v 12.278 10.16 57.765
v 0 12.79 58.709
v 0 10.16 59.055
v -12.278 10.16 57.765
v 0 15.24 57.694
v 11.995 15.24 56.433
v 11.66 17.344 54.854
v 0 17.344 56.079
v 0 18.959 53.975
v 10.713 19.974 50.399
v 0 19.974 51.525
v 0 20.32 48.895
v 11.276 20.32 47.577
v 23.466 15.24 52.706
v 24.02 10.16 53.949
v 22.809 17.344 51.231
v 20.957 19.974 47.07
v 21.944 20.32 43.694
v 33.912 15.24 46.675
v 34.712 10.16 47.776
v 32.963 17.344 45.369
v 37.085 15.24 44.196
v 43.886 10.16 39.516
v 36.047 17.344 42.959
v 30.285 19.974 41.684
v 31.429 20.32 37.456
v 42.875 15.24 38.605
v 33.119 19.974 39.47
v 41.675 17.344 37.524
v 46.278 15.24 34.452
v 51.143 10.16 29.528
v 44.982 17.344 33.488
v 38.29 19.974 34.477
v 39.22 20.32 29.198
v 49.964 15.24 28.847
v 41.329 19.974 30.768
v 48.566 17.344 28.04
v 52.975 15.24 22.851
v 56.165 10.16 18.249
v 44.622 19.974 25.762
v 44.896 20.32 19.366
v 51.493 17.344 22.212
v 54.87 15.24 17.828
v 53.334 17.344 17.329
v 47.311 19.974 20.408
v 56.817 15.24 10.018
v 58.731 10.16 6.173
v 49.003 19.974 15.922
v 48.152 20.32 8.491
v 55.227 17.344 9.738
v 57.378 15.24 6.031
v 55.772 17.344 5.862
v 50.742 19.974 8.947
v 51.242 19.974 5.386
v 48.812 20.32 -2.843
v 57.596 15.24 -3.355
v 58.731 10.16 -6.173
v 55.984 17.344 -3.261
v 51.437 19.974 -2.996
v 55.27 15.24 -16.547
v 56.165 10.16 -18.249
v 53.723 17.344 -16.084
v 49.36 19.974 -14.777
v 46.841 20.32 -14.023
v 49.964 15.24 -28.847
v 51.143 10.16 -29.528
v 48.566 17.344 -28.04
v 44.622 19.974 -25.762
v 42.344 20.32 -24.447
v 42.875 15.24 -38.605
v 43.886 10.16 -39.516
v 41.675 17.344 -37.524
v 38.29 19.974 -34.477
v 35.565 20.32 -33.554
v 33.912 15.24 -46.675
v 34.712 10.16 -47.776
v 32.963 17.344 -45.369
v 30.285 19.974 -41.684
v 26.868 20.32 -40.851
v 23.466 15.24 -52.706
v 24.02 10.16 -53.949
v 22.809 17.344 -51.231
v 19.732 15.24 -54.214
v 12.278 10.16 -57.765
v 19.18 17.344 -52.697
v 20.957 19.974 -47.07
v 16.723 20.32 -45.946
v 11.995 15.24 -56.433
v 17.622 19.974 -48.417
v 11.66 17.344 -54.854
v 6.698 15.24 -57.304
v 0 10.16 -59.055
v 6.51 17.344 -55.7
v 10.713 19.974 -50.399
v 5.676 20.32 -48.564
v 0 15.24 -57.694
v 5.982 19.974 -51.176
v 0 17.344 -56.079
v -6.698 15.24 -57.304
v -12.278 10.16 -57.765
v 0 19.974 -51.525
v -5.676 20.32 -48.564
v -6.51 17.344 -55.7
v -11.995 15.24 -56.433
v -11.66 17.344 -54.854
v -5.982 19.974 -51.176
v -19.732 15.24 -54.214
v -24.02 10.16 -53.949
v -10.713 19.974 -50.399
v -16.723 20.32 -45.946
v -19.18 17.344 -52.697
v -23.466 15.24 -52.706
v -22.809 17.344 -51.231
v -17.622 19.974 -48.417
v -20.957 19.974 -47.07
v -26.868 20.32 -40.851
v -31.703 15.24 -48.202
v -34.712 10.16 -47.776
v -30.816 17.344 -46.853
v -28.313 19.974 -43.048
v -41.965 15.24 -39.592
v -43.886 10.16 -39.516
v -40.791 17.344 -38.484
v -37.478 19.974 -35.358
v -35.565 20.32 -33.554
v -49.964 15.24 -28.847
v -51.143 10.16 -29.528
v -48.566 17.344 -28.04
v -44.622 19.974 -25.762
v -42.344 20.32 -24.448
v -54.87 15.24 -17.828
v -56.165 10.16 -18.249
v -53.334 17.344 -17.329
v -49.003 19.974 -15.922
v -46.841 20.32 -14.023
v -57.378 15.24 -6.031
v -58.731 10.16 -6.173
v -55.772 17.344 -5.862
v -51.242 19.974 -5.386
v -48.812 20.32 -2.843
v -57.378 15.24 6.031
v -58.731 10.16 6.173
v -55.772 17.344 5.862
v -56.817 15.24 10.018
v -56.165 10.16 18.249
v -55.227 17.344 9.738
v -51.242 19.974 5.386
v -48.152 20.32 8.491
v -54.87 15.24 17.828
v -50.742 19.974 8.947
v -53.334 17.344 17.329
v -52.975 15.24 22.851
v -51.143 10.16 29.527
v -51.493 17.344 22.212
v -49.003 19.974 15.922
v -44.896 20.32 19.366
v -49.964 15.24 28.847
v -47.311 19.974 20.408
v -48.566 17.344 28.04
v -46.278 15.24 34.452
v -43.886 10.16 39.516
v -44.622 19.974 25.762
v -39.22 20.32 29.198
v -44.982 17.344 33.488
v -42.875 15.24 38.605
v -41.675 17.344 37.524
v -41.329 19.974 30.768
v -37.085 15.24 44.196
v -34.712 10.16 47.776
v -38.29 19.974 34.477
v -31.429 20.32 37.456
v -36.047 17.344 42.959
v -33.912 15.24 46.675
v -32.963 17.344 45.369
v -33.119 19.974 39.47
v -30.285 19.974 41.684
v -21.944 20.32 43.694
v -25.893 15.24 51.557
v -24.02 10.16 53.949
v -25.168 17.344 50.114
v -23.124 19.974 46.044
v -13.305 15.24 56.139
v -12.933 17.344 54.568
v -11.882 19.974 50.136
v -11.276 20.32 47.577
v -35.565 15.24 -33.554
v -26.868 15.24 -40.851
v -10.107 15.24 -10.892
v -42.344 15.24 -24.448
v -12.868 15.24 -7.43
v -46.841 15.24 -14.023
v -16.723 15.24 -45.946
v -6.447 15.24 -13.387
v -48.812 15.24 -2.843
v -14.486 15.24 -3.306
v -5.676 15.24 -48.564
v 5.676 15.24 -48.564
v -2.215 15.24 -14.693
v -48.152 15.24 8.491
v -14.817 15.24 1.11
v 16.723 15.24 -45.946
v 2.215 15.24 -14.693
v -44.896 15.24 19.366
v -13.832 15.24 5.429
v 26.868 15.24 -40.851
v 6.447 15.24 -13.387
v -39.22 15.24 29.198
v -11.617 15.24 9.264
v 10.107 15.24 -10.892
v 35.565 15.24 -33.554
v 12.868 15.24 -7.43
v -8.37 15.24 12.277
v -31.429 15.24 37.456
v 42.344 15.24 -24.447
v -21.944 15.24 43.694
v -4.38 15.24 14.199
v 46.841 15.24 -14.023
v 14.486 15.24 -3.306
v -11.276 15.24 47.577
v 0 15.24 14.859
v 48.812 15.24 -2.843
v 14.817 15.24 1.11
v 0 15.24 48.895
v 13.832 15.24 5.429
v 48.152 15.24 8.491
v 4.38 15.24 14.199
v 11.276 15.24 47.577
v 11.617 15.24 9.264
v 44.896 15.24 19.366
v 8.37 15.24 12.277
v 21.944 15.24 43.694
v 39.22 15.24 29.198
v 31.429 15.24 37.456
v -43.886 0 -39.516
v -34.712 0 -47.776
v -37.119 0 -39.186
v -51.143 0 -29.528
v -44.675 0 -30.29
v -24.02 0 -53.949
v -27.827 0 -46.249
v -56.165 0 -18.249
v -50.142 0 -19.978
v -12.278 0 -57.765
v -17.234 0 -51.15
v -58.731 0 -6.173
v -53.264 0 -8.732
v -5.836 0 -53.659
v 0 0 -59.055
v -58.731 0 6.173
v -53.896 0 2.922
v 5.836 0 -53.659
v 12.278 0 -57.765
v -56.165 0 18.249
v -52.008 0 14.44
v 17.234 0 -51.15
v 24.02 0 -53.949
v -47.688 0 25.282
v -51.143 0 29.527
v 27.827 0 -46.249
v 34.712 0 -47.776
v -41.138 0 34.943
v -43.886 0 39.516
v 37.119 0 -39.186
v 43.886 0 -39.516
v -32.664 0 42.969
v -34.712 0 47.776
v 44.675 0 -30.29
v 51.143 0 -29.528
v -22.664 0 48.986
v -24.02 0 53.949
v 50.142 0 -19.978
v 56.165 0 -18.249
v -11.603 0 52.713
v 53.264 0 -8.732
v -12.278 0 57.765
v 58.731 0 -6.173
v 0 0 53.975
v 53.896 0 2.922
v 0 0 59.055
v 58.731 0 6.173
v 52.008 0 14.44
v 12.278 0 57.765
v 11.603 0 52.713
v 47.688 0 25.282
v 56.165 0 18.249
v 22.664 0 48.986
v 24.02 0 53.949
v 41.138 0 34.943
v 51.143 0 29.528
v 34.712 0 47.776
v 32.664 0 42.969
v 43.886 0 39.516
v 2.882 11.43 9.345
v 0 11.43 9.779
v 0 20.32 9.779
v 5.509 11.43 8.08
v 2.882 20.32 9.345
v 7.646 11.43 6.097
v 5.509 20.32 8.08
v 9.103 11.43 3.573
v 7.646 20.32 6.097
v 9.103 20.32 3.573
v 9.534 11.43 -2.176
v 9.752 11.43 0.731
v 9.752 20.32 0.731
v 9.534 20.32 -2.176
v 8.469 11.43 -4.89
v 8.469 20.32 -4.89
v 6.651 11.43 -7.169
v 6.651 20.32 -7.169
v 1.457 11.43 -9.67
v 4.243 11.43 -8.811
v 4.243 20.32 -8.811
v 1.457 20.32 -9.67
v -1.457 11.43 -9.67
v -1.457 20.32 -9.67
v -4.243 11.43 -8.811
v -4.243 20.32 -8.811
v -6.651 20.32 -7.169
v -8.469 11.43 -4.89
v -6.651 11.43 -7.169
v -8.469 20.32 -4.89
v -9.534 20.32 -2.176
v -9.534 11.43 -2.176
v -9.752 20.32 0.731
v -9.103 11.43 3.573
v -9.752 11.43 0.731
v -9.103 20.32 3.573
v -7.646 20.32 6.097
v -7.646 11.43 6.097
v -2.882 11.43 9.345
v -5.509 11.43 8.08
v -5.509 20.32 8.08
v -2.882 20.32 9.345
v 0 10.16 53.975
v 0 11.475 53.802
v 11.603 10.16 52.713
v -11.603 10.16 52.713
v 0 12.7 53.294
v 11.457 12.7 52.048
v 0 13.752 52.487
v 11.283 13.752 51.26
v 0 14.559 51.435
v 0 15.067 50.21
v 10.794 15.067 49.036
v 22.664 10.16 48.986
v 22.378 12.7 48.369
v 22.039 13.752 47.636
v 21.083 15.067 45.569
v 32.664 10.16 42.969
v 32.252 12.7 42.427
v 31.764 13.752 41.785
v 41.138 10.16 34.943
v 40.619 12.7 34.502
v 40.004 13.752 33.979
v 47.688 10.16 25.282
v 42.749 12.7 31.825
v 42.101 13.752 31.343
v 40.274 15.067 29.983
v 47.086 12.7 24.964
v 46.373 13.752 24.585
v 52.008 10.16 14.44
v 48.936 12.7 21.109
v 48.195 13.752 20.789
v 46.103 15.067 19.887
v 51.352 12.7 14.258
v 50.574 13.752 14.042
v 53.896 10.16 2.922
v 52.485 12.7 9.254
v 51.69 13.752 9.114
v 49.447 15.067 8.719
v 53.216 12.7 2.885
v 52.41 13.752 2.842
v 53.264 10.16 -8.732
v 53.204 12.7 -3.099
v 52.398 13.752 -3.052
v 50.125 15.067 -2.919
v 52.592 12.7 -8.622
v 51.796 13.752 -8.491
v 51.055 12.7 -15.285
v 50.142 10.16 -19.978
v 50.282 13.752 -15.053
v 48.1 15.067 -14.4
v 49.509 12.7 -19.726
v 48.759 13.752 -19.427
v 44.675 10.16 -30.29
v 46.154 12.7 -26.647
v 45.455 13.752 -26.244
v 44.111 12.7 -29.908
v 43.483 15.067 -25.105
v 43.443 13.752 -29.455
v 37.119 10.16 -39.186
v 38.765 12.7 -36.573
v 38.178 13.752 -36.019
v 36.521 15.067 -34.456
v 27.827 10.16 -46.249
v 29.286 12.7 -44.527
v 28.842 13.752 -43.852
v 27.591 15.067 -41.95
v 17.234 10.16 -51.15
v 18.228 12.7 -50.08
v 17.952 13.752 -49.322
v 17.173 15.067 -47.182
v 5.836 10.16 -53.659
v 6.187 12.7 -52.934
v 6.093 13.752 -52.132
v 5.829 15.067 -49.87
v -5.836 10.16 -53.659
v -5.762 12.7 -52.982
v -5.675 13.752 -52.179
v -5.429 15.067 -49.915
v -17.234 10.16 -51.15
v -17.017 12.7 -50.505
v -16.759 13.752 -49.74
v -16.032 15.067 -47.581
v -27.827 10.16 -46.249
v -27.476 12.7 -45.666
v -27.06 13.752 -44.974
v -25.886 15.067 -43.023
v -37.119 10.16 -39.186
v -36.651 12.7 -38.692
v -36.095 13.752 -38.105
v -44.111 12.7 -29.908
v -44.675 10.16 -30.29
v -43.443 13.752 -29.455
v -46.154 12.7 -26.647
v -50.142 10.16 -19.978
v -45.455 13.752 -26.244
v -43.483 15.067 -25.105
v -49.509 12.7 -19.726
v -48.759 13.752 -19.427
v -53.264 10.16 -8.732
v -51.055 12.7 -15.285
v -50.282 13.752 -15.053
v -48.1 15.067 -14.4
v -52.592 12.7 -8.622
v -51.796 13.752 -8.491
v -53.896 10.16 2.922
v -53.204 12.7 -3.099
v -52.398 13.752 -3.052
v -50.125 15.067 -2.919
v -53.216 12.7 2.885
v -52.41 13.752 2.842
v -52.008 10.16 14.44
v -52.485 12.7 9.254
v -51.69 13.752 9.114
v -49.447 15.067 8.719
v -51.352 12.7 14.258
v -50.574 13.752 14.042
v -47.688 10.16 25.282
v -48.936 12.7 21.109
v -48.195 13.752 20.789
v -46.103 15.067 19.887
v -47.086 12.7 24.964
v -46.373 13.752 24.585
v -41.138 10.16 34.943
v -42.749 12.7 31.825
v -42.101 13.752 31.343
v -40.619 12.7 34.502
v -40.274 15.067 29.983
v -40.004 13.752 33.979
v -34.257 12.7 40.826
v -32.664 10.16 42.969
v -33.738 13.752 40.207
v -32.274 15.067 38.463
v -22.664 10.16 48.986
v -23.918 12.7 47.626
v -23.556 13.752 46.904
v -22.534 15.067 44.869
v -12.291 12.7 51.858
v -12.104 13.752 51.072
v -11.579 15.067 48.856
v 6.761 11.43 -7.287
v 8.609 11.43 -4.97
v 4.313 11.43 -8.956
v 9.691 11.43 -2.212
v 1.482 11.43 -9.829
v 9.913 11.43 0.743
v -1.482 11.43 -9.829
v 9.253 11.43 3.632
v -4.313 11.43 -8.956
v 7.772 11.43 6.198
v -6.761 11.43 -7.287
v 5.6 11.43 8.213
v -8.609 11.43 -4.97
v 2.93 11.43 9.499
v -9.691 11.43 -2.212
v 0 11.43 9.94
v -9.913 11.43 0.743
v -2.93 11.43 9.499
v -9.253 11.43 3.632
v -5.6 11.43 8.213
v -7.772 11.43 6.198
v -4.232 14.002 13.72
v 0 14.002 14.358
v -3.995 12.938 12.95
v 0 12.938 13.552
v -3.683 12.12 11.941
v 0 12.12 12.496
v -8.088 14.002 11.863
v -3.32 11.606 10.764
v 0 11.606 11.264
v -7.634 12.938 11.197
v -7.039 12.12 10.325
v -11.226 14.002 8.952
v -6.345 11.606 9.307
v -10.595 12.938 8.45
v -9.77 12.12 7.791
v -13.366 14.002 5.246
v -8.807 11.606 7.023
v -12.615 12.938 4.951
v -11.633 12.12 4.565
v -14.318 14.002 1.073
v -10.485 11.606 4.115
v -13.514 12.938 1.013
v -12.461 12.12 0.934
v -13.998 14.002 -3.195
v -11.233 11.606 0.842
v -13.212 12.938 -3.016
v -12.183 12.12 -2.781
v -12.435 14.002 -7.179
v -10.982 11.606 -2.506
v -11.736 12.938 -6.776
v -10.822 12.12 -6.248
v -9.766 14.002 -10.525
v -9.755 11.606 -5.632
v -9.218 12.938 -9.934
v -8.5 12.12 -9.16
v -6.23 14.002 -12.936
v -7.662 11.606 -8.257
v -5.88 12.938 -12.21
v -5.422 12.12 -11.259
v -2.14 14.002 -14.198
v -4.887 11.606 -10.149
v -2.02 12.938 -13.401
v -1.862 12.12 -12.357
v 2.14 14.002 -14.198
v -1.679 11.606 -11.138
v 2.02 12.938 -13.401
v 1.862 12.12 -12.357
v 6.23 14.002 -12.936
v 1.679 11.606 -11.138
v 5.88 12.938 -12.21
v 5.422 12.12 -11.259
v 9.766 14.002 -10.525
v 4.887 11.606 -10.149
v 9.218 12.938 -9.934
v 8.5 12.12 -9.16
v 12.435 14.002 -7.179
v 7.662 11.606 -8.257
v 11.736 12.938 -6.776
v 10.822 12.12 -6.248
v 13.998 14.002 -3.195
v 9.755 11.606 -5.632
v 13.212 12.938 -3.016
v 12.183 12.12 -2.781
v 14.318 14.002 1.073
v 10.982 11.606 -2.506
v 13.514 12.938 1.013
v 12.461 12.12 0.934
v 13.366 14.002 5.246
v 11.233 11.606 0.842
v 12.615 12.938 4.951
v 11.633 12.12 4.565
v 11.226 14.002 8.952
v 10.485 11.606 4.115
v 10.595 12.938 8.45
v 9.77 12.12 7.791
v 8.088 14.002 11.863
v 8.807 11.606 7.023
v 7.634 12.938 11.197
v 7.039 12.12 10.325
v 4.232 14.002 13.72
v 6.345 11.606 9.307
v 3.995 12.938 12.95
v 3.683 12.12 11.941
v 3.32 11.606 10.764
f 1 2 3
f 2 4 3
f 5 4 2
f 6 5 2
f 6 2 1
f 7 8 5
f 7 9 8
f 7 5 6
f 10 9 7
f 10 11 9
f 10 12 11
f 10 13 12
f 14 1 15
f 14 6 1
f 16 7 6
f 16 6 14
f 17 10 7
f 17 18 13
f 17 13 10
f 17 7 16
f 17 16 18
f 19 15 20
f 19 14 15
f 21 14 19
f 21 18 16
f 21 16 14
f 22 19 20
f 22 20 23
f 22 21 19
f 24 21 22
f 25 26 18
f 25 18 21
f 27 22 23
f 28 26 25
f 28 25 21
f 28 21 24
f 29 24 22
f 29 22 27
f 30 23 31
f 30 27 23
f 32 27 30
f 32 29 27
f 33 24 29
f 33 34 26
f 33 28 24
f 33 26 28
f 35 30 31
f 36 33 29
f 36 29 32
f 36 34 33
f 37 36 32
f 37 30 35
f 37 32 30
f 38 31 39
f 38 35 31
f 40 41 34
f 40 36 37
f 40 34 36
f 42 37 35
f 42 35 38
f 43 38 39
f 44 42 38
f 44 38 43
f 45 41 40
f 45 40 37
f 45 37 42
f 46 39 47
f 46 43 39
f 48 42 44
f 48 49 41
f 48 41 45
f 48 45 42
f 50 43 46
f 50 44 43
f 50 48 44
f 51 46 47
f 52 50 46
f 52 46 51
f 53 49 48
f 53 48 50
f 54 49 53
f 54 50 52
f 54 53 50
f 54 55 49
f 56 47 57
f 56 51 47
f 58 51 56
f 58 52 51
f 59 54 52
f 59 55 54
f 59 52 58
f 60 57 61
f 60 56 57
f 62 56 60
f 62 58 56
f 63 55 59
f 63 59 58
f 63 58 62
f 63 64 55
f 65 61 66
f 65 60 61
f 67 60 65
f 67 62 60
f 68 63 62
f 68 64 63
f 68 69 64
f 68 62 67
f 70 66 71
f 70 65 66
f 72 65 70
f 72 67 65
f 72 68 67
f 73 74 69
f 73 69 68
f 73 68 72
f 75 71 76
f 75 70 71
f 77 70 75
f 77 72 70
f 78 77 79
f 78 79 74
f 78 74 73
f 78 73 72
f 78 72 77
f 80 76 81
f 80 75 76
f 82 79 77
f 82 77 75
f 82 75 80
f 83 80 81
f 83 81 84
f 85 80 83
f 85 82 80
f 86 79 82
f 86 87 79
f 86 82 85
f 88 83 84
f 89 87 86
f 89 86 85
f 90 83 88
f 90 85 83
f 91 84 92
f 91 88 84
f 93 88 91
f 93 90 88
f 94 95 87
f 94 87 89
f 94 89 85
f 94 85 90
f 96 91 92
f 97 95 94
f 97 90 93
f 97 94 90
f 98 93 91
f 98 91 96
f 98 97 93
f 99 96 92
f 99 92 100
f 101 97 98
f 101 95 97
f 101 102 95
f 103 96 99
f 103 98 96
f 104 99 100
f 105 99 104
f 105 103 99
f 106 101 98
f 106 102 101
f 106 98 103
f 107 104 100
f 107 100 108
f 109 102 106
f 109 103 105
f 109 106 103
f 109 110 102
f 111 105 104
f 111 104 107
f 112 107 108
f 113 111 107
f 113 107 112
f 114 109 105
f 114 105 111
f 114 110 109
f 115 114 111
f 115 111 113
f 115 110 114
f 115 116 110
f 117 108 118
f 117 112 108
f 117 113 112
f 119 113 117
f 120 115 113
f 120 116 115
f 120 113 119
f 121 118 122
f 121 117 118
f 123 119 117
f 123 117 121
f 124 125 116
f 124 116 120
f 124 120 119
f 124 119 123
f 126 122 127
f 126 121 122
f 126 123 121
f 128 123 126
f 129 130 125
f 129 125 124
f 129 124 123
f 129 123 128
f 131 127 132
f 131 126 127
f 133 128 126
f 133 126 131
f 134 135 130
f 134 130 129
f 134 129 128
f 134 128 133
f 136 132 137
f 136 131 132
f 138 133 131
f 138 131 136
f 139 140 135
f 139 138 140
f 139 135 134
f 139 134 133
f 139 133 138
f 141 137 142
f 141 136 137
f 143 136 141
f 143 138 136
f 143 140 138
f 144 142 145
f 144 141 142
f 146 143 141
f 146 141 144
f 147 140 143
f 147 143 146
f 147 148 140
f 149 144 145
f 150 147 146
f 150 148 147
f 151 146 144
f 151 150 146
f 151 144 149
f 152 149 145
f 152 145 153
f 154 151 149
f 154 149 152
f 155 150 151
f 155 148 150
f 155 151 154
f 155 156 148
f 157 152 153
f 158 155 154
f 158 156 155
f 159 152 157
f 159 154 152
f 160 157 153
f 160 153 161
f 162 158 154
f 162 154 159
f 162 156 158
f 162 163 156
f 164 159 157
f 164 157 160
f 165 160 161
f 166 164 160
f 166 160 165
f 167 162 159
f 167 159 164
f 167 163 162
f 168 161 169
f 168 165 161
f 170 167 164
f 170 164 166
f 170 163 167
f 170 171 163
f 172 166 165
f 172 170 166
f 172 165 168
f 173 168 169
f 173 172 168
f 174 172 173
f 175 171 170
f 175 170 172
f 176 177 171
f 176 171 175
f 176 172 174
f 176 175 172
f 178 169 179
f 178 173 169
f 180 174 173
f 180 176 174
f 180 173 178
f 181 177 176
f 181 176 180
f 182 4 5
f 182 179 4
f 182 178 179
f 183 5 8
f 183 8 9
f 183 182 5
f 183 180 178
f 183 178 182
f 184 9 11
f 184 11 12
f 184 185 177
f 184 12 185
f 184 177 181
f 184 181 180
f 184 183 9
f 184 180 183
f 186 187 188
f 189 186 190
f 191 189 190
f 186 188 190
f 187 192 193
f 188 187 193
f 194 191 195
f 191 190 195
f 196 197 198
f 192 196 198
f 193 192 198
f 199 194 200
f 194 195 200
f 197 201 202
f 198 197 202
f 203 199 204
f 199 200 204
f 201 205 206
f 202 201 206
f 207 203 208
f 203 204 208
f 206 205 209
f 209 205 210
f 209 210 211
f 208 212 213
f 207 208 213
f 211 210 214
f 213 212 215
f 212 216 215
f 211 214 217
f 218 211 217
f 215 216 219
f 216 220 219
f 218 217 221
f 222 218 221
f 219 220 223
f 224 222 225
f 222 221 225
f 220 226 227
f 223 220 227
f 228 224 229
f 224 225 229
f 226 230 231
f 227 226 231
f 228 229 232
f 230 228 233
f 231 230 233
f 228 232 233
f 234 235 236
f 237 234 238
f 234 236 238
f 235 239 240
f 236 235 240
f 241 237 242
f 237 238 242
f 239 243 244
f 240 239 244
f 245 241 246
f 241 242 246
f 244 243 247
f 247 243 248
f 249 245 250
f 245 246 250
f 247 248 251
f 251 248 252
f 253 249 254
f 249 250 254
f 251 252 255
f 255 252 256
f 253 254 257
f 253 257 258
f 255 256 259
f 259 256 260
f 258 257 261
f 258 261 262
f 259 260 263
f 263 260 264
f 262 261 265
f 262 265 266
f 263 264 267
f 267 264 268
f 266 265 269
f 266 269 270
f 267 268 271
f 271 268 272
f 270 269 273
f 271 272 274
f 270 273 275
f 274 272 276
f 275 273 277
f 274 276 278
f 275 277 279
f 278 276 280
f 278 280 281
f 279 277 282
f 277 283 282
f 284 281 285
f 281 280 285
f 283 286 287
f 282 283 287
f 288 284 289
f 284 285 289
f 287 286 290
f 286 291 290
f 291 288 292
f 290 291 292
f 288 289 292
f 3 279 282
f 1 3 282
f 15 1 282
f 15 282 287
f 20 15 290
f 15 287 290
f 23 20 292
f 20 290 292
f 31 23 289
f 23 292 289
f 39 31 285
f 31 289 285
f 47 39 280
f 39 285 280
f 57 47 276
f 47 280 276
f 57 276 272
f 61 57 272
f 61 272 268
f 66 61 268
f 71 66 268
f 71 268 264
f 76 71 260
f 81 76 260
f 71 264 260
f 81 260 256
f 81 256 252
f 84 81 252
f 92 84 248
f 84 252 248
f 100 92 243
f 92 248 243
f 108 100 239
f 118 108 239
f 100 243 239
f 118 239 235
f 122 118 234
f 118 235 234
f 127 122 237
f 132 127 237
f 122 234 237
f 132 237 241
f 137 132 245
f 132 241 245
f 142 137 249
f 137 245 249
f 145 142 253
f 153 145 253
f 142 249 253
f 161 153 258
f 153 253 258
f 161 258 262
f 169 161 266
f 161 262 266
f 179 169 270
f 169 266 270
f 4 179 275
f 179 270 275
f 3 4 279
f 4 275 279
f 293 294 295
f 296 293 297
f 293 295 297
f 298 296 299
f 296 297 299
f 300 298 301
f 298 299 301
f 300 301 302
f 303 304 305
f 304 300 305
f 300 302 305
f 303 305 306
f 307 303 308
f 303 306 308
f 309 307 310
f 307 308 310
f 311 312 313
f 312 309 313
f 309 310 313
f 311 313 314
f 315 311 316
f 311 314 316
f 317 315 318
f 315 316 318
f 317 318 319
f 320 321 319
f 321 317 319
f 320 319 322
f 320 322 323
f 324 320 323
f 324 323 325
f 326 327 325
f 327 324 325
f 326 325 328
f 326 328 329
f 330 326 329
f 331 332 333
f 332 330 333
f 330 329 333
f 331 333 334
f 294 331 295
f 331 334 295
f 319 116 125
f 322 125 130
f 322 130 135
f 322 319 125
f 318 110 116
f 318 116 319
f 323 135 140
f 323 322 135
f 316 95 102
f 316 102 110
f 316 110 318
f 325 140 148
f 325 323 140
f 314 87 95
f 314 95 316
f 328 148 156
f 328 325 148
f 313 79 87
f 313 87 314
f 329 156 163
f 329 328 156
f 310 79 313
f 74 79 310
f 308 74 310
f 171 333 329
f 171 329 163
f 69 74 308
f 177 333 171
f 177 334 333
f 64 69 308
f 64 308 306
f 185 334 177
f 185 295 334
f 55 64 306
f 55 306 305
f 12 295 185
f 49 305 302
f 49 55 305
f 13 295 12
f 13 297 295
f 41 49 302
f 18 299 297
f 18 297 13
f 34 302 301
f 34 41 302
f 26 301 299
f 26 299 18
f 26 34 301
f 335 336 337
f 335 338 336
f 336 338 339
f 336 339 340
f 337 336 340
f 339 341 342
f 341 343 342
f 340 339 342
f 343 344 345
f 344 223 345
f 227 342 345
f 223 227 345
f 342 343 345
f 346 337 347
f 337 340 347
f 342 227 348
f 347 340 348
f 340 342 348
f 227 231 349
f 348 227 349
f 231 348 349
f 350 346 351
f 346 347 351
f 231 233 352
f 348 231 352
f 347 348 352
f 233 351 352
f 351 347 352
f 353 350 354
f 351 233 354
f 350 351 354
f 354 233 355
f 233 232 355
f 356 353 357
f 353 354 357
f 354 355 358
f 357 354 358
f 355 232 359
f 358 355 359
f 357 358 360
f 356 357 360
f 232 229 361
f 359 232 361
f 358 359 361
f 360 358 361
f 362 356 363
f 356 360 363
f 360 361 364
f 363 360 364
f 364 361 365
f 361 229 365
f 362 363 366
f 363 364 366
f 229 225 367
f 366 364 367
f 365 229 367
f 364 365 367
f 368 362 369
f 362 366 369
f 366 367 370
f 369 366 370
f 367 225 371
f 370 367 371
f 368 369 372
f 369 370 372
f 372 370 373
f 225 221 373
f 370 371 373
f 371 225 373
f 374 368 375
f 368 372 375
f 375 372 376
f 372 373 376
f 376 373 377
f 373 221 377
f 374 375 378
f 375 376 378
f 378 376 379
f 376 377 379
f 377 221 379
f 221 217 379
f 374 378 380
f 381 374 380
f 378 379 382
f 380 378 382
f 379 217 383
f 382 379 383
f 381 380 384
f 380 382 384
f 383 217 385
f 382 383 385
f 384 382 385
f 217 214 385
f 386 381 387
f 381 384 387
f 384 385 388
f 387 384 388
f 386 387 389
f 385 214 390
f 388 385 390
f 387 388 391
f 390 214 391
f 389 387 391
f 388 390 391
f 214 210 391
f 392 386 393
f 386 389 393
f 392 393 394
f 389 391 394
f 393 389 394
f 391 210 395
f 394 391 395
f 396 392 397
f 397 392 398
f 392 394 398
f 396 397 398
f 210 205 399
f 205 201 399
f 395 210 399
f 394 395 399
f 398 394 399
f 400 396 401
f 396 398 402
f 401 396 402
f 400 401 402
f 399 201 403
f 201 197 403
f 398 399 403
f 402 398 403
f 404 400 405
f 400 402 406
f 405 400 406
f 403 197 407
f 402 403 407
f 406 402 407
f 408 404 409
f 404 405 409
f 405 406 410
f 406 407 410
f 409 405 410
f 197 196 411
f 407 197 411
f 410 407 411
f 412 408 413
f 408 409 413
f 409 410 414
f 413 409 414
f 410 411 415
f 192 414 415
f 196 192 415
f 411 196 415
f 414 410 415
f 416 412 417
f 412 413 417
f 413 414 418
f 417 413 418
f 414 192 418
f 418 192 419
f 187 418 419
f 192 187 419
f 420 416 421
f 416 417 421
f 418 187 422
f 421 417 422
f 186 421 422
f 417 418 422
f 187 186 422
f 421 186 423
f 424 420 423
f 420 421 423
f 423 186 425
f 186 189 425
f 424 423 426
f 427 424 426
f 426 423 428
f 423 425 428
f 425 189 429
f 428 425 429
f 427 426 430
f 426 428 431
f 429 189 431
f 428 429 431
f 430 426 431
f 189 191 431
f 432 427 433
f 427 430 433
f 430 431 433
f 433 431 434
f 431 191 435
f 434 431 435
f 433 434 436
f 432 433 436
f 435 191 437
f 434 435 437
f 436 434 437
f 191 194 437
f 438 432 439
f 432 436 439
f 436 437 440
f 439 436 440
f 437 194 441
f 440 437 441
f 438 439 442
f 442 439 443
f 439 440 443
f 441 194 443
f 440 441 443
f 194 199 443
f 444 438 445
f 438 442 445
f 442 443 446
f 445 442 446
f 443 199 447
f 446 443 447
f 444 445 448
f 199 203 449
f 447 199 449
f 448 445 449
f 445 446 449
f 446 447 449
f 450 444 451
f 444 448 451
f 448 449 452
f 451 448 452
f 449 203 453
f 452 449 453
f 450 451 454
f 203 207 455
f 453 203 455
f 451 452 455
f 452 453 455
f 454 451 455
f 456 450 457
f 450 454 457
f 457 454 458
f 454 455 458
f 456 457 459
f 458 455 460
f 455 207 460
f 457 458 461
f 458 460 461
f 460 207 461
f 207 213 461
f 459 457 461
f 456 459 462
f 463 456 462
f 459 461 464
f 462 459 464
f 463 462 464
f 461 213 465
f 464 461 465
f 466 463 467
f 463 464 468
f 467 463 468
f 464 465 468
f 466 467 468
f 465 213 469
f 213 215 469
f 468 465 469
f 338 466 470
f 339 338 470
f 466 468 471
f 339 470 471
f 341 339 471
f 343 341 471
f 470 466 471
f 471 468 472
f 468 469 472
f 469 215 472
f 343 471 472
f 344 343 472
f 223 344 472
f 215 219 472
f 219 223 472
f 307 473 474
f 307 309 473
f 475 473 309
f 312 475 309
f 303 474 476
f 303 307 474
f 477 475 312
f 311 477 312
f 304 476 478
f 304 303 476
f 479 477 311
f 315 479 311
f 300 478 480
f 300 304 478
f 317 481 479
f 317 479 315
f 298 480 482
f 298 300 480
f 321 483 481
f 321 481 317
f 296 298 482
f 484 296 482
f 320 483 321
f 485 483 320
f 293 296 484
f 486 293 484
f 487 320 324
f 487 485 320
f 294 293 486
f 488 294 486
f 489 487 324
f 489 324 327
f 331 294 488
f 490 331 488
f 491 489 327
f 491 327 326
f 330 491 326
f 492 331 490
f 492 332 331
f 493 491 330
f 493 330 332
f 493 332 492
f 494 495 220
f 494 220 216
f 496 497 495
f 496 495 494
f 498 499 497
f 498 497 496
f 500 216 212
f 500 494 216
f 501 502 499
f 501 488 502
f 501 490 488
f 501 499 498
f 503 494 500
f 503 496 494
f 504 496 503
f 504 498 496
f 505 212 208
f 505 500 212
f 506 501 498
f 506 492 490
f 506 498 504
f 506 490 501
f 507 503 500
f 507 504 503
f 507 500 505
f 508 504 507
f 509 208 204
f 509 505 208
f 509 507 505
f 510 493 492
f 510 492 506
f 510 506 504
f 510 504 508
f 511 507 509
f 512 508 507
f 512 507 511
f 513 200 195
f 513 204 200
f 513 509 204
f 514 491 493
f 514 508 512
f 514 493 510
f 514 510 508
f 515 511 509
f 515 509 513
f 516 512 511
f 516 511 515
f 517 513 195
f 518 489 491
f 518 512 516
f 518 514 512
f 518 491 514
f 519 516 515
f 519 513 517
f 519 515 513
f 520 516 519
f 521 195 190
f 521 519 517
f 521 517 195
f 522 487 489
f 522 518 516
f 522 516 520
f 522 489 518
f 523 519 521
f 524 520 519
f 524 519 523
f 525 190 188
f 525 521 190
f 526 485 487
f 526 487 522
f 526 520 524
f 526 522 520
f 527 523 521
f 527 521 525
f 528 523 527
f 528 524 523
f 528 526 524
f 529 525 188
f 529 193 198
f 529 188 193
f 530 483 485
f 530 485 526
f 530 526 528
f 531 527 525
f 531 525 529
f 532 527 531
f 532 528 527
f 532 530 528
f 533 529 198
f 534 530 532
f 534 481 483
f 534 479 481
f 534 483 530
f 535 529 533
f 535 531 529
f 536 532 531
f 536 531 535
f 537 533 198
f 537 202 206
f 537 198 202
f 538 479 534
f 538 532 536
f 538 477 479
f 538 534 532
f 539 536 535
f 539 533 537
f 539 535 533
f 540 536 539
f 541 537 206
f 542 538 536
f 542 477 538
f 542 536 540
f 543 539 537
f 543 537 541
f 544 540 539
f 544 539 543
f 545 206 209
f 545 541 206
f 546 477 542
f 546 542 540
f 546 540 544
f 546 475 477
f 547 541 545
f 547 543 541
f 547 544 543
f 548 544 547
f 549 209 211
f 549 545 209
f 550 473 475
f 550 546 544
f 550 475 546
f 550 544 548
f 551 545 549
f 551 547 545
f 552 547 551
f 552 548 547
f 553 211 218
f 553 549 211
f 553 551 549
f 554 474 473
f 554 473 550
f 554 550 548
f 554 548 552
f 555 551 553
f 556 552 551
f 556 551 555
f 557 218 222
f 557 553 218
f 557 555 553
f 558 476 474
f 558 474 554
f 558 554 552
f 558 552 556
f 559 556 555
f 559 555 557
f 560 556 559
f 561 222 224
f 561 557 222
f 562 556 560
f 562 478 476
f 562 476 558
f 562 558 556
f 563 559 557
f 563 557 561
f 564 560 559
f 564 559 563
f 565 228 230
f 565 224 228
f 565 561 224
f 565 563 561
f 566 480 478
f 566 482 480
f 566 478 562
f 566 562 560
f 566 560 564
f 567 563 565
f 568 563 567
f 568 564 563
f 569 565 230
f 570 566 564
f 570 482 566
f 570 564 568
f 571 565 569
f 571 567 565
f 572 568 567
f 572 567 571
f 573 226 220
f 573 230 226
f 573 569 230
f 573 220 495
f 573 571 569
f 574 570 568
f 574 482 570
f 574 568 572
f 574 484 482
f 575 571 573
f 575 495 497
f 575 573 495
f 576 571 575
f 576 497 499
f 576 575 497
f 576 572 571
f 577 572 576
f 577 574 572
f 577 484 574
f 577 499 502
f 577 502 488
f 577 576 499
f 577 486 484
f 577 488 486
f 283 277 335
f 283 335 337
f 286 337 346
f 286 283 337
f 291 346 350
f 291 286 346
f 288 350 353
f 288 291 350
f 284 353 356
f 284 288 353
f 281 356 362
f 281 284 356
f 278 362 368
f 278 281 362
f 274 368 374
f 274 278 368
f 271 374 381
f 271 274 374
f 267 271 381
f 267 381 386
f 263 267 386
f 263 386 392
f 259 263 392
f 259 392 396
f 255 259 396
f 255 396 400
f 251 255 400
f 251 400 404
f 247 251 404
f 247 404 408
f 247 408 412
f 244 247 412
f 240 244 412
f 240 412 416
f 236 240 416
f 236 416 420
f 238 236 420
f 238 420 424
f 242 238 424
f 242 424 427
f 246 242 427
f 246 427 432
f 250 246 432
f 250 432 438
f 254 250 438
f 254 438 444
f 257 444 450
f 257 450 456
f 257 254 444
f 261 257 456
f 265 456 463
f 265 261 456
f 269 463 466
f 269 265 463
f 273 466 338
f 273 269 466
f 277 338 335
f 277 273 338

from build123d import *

# Parameters (mm, degrees)
SKETCH1_R           = 59.055
BOSS_EXTRUDE1_DEPTH = 20.32
SKETCH2_R           = 9.779
CUT_EXTRUDE1_DEPTH  = 86.952826888
FILLET1_R           = 10.16
SHELL2_T            = -5.08
CUT_EXTRUDE3_START  = -11.43
SKETCH4_R           = 14.859
SKETCH4_R_2         = 9.779
CUT_EXTRUDE3_DEPTH  = 11.43
FILLET3_R           = 5.08


with BuildPart() as part:
    # Sketch1 → Boss-Extrude1 (new body)
    with BuildSketch(Plane(origin=(0, 0, 0), x_dir=(1, 0, 0), z_dir=(0, 1, 0))):
        with Locations(Location((0, 0, 0), (0, 0, 270))):
            Circle(SKETCH1_R)
    extrude(amount=BOSS_EXTRUDE1_DEPTH)

    # Sketch2 → Cut-Extrude1 (cut, through all)
    with BuildSketch(Plane(origin=(0, 20.32, 0), x_dir=(1, 0, 0), z_dir=(0, 1, 0))):
        with Locations(Location((0, 0, 0), (0, 0, 270))):
            Circle(SKETCH2_R)
    extrude(amount=-CUT_EXTRUDE1_DEPTH, mode=Mode.SUBTRACT)

    # Fillet1
    fillet1_edges = [part.edges().sort_by_distance(p)[0] for p in [
        (0, 20.32, -59.055),
    ]]
    fillet(fillet1_edges, radius=FILLET1_R)

    # Shell2
    shell2_openings = [part.faces().sort_by_distance(p)[0] for p in [
        (0, 0, -57.384672361),
    ]]
    offset(amount=SHELL2_T, openings=shell2_openings, kind=Kind.INTERSECTION)

    # Sketch4 → Cut-Extrude3 (cut)
    with BuildSketch(Plane.XZ.offset(CUT_EXTRUDE3_START)):
        with Locations(Location((0, 0, 0), (0, 0, 90))):
            Circle(SKETCH4_R)
        with Locations(Location((0, 0, 0), (0, 0, 90))):
            Circle(SKETCH4_R_2, mode=Mode.SUBTRACT)
    extrude(amount=CUT_EXTRUDE3_DEPTH, mode=Mode.SUBTRACT)

    # Fillet3
    # the kernel refuses this fillet: 5.08 mm, written as the material it takes off along each edge
    with BuildSketch(Plane(origin=(0, 11.43, 0), x_dir=(0, 0, 1), z_dir=(1, 0, 0))) as fillet3_piece_1:
        with BuildLine():
            CenterArc((9.94031115, -5.08), FILLET3_R, 14.477512186, 75.522487814)
            Line((14.859, -3.81), (14.957373777, -3.7846))
            ThreePointArc((14.957373777, -3.7846), (14.9606, -1.905), (14.9606, 0))
            Line((14.9606, 0), (14.859, 0.1016))
            Line((14.859, 0.1016), (9.94031115, 0.1016))
            Line((9.94031115, 0.1016), (9.94031115, 0))
        make_face()
    revolve(axis=Axis((0, 11.43, 0), (0, -1, 0)), mode=Mode.SUBTRACT)


solid = part.part
